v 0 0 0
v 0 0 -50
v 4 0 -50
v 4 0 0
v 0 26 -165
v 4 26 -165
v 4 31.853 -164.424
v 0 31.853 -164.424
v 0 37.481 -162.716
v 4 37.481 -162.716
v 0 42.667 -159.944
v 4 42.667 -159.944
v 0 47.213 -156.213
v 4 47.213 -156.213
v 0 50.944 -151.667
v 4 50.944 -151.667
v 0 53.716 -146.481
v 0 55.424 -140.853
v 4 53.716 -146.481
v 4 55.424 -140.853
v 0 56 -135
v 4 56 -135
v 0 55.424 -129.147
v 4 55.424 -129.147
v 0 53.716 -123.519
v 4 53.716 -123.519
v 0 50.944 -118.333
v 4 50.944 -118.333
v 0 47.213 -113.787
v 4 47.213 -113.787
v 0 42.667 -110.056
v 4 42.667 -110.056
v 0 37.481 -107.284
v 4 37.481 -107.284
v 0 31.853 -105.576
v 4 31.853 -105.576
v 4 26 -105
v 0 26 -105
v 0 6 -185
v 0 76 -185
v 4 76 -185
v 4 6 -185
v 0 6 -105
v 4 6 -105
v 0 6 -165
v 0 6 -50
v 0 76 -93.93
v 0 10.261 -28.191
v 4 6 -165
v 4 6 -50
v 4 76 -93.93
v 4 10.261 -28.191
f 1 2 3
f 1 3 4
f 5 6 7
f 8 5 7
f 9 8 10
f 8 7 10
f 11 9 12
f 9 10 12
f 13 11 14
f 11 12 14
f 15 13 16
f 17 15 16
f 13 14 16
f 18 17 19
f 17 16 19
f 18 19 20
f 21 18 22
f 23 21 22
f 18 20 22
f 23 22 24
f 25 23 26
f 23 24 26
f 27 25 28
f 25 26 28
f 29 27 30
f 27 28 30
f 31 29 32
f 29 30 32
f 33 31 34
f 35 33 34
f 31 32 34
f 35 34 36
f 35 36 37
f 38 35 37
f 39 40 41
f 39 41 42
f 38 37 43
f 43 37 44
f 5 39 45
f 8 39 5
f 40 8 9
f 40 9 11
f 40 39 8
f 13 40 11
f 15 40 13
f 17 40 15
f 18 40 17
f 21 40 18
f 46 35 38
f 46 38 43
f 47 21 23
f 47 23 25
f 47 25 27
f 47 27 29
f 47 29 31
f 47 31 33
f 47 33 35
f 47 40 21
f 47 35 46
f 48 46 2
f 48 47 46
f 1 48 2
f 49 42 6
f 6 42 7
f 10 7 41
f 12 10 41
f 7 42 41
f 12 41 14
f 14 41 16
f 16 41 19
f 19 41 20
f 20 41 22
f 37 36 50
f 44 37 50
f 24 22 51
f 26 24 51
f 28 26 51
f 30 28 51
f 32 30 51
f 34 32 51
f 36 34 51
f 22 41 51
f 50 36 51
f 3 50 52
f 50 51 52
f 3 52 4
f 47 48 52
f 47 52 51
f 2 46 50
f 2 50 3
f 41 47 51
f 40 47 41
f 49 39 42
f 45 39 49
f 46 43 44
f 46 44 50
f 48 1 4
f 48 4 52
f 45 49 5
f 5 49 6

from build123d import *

# Parameters (mm, degrees)
SALIENTE_EXTRUIR2_DEPTH = 4
CORTAR_EXTRUIR1_DEPTH   = 4


with BuildPart() as part:
    # Croquis1 → Saliente-Extruir2 (new body)
    with BuildSketch(Plane(origin=(0, 0, 0), x_dir=(0, 0, -1), z_dir=(1, 0, 0))):
        Polygon((0, 0), (28.190778624, 10.2606043), (93.930174324, 76), (185, 76), (185, 6), (50, 6), (50, 0), align=None)
    extrude(amount=SALIENTE_EXTRUIR2_DEPTH)

    # Croquis2 → Cortar-Extruir1 (cut)
    with BuildSketch(Plane(origin=(4, 0, 0), x_dir=(0, 0, -1), z_dir=(1, 0, 0))):
        with BuildLine():
            Line((105, 6), (165, 6))
            Line((165, 6), (165, 26))
            ThreePointArc((165, 26), (135, 56), (105, 26))
            Line((105, 26), (105, 6))
        make_face()
    extrude(amount=-CORTAR_EXTRUIR1_DEPTH, mode=Mode.SUBTRACT)


solid = part.part
